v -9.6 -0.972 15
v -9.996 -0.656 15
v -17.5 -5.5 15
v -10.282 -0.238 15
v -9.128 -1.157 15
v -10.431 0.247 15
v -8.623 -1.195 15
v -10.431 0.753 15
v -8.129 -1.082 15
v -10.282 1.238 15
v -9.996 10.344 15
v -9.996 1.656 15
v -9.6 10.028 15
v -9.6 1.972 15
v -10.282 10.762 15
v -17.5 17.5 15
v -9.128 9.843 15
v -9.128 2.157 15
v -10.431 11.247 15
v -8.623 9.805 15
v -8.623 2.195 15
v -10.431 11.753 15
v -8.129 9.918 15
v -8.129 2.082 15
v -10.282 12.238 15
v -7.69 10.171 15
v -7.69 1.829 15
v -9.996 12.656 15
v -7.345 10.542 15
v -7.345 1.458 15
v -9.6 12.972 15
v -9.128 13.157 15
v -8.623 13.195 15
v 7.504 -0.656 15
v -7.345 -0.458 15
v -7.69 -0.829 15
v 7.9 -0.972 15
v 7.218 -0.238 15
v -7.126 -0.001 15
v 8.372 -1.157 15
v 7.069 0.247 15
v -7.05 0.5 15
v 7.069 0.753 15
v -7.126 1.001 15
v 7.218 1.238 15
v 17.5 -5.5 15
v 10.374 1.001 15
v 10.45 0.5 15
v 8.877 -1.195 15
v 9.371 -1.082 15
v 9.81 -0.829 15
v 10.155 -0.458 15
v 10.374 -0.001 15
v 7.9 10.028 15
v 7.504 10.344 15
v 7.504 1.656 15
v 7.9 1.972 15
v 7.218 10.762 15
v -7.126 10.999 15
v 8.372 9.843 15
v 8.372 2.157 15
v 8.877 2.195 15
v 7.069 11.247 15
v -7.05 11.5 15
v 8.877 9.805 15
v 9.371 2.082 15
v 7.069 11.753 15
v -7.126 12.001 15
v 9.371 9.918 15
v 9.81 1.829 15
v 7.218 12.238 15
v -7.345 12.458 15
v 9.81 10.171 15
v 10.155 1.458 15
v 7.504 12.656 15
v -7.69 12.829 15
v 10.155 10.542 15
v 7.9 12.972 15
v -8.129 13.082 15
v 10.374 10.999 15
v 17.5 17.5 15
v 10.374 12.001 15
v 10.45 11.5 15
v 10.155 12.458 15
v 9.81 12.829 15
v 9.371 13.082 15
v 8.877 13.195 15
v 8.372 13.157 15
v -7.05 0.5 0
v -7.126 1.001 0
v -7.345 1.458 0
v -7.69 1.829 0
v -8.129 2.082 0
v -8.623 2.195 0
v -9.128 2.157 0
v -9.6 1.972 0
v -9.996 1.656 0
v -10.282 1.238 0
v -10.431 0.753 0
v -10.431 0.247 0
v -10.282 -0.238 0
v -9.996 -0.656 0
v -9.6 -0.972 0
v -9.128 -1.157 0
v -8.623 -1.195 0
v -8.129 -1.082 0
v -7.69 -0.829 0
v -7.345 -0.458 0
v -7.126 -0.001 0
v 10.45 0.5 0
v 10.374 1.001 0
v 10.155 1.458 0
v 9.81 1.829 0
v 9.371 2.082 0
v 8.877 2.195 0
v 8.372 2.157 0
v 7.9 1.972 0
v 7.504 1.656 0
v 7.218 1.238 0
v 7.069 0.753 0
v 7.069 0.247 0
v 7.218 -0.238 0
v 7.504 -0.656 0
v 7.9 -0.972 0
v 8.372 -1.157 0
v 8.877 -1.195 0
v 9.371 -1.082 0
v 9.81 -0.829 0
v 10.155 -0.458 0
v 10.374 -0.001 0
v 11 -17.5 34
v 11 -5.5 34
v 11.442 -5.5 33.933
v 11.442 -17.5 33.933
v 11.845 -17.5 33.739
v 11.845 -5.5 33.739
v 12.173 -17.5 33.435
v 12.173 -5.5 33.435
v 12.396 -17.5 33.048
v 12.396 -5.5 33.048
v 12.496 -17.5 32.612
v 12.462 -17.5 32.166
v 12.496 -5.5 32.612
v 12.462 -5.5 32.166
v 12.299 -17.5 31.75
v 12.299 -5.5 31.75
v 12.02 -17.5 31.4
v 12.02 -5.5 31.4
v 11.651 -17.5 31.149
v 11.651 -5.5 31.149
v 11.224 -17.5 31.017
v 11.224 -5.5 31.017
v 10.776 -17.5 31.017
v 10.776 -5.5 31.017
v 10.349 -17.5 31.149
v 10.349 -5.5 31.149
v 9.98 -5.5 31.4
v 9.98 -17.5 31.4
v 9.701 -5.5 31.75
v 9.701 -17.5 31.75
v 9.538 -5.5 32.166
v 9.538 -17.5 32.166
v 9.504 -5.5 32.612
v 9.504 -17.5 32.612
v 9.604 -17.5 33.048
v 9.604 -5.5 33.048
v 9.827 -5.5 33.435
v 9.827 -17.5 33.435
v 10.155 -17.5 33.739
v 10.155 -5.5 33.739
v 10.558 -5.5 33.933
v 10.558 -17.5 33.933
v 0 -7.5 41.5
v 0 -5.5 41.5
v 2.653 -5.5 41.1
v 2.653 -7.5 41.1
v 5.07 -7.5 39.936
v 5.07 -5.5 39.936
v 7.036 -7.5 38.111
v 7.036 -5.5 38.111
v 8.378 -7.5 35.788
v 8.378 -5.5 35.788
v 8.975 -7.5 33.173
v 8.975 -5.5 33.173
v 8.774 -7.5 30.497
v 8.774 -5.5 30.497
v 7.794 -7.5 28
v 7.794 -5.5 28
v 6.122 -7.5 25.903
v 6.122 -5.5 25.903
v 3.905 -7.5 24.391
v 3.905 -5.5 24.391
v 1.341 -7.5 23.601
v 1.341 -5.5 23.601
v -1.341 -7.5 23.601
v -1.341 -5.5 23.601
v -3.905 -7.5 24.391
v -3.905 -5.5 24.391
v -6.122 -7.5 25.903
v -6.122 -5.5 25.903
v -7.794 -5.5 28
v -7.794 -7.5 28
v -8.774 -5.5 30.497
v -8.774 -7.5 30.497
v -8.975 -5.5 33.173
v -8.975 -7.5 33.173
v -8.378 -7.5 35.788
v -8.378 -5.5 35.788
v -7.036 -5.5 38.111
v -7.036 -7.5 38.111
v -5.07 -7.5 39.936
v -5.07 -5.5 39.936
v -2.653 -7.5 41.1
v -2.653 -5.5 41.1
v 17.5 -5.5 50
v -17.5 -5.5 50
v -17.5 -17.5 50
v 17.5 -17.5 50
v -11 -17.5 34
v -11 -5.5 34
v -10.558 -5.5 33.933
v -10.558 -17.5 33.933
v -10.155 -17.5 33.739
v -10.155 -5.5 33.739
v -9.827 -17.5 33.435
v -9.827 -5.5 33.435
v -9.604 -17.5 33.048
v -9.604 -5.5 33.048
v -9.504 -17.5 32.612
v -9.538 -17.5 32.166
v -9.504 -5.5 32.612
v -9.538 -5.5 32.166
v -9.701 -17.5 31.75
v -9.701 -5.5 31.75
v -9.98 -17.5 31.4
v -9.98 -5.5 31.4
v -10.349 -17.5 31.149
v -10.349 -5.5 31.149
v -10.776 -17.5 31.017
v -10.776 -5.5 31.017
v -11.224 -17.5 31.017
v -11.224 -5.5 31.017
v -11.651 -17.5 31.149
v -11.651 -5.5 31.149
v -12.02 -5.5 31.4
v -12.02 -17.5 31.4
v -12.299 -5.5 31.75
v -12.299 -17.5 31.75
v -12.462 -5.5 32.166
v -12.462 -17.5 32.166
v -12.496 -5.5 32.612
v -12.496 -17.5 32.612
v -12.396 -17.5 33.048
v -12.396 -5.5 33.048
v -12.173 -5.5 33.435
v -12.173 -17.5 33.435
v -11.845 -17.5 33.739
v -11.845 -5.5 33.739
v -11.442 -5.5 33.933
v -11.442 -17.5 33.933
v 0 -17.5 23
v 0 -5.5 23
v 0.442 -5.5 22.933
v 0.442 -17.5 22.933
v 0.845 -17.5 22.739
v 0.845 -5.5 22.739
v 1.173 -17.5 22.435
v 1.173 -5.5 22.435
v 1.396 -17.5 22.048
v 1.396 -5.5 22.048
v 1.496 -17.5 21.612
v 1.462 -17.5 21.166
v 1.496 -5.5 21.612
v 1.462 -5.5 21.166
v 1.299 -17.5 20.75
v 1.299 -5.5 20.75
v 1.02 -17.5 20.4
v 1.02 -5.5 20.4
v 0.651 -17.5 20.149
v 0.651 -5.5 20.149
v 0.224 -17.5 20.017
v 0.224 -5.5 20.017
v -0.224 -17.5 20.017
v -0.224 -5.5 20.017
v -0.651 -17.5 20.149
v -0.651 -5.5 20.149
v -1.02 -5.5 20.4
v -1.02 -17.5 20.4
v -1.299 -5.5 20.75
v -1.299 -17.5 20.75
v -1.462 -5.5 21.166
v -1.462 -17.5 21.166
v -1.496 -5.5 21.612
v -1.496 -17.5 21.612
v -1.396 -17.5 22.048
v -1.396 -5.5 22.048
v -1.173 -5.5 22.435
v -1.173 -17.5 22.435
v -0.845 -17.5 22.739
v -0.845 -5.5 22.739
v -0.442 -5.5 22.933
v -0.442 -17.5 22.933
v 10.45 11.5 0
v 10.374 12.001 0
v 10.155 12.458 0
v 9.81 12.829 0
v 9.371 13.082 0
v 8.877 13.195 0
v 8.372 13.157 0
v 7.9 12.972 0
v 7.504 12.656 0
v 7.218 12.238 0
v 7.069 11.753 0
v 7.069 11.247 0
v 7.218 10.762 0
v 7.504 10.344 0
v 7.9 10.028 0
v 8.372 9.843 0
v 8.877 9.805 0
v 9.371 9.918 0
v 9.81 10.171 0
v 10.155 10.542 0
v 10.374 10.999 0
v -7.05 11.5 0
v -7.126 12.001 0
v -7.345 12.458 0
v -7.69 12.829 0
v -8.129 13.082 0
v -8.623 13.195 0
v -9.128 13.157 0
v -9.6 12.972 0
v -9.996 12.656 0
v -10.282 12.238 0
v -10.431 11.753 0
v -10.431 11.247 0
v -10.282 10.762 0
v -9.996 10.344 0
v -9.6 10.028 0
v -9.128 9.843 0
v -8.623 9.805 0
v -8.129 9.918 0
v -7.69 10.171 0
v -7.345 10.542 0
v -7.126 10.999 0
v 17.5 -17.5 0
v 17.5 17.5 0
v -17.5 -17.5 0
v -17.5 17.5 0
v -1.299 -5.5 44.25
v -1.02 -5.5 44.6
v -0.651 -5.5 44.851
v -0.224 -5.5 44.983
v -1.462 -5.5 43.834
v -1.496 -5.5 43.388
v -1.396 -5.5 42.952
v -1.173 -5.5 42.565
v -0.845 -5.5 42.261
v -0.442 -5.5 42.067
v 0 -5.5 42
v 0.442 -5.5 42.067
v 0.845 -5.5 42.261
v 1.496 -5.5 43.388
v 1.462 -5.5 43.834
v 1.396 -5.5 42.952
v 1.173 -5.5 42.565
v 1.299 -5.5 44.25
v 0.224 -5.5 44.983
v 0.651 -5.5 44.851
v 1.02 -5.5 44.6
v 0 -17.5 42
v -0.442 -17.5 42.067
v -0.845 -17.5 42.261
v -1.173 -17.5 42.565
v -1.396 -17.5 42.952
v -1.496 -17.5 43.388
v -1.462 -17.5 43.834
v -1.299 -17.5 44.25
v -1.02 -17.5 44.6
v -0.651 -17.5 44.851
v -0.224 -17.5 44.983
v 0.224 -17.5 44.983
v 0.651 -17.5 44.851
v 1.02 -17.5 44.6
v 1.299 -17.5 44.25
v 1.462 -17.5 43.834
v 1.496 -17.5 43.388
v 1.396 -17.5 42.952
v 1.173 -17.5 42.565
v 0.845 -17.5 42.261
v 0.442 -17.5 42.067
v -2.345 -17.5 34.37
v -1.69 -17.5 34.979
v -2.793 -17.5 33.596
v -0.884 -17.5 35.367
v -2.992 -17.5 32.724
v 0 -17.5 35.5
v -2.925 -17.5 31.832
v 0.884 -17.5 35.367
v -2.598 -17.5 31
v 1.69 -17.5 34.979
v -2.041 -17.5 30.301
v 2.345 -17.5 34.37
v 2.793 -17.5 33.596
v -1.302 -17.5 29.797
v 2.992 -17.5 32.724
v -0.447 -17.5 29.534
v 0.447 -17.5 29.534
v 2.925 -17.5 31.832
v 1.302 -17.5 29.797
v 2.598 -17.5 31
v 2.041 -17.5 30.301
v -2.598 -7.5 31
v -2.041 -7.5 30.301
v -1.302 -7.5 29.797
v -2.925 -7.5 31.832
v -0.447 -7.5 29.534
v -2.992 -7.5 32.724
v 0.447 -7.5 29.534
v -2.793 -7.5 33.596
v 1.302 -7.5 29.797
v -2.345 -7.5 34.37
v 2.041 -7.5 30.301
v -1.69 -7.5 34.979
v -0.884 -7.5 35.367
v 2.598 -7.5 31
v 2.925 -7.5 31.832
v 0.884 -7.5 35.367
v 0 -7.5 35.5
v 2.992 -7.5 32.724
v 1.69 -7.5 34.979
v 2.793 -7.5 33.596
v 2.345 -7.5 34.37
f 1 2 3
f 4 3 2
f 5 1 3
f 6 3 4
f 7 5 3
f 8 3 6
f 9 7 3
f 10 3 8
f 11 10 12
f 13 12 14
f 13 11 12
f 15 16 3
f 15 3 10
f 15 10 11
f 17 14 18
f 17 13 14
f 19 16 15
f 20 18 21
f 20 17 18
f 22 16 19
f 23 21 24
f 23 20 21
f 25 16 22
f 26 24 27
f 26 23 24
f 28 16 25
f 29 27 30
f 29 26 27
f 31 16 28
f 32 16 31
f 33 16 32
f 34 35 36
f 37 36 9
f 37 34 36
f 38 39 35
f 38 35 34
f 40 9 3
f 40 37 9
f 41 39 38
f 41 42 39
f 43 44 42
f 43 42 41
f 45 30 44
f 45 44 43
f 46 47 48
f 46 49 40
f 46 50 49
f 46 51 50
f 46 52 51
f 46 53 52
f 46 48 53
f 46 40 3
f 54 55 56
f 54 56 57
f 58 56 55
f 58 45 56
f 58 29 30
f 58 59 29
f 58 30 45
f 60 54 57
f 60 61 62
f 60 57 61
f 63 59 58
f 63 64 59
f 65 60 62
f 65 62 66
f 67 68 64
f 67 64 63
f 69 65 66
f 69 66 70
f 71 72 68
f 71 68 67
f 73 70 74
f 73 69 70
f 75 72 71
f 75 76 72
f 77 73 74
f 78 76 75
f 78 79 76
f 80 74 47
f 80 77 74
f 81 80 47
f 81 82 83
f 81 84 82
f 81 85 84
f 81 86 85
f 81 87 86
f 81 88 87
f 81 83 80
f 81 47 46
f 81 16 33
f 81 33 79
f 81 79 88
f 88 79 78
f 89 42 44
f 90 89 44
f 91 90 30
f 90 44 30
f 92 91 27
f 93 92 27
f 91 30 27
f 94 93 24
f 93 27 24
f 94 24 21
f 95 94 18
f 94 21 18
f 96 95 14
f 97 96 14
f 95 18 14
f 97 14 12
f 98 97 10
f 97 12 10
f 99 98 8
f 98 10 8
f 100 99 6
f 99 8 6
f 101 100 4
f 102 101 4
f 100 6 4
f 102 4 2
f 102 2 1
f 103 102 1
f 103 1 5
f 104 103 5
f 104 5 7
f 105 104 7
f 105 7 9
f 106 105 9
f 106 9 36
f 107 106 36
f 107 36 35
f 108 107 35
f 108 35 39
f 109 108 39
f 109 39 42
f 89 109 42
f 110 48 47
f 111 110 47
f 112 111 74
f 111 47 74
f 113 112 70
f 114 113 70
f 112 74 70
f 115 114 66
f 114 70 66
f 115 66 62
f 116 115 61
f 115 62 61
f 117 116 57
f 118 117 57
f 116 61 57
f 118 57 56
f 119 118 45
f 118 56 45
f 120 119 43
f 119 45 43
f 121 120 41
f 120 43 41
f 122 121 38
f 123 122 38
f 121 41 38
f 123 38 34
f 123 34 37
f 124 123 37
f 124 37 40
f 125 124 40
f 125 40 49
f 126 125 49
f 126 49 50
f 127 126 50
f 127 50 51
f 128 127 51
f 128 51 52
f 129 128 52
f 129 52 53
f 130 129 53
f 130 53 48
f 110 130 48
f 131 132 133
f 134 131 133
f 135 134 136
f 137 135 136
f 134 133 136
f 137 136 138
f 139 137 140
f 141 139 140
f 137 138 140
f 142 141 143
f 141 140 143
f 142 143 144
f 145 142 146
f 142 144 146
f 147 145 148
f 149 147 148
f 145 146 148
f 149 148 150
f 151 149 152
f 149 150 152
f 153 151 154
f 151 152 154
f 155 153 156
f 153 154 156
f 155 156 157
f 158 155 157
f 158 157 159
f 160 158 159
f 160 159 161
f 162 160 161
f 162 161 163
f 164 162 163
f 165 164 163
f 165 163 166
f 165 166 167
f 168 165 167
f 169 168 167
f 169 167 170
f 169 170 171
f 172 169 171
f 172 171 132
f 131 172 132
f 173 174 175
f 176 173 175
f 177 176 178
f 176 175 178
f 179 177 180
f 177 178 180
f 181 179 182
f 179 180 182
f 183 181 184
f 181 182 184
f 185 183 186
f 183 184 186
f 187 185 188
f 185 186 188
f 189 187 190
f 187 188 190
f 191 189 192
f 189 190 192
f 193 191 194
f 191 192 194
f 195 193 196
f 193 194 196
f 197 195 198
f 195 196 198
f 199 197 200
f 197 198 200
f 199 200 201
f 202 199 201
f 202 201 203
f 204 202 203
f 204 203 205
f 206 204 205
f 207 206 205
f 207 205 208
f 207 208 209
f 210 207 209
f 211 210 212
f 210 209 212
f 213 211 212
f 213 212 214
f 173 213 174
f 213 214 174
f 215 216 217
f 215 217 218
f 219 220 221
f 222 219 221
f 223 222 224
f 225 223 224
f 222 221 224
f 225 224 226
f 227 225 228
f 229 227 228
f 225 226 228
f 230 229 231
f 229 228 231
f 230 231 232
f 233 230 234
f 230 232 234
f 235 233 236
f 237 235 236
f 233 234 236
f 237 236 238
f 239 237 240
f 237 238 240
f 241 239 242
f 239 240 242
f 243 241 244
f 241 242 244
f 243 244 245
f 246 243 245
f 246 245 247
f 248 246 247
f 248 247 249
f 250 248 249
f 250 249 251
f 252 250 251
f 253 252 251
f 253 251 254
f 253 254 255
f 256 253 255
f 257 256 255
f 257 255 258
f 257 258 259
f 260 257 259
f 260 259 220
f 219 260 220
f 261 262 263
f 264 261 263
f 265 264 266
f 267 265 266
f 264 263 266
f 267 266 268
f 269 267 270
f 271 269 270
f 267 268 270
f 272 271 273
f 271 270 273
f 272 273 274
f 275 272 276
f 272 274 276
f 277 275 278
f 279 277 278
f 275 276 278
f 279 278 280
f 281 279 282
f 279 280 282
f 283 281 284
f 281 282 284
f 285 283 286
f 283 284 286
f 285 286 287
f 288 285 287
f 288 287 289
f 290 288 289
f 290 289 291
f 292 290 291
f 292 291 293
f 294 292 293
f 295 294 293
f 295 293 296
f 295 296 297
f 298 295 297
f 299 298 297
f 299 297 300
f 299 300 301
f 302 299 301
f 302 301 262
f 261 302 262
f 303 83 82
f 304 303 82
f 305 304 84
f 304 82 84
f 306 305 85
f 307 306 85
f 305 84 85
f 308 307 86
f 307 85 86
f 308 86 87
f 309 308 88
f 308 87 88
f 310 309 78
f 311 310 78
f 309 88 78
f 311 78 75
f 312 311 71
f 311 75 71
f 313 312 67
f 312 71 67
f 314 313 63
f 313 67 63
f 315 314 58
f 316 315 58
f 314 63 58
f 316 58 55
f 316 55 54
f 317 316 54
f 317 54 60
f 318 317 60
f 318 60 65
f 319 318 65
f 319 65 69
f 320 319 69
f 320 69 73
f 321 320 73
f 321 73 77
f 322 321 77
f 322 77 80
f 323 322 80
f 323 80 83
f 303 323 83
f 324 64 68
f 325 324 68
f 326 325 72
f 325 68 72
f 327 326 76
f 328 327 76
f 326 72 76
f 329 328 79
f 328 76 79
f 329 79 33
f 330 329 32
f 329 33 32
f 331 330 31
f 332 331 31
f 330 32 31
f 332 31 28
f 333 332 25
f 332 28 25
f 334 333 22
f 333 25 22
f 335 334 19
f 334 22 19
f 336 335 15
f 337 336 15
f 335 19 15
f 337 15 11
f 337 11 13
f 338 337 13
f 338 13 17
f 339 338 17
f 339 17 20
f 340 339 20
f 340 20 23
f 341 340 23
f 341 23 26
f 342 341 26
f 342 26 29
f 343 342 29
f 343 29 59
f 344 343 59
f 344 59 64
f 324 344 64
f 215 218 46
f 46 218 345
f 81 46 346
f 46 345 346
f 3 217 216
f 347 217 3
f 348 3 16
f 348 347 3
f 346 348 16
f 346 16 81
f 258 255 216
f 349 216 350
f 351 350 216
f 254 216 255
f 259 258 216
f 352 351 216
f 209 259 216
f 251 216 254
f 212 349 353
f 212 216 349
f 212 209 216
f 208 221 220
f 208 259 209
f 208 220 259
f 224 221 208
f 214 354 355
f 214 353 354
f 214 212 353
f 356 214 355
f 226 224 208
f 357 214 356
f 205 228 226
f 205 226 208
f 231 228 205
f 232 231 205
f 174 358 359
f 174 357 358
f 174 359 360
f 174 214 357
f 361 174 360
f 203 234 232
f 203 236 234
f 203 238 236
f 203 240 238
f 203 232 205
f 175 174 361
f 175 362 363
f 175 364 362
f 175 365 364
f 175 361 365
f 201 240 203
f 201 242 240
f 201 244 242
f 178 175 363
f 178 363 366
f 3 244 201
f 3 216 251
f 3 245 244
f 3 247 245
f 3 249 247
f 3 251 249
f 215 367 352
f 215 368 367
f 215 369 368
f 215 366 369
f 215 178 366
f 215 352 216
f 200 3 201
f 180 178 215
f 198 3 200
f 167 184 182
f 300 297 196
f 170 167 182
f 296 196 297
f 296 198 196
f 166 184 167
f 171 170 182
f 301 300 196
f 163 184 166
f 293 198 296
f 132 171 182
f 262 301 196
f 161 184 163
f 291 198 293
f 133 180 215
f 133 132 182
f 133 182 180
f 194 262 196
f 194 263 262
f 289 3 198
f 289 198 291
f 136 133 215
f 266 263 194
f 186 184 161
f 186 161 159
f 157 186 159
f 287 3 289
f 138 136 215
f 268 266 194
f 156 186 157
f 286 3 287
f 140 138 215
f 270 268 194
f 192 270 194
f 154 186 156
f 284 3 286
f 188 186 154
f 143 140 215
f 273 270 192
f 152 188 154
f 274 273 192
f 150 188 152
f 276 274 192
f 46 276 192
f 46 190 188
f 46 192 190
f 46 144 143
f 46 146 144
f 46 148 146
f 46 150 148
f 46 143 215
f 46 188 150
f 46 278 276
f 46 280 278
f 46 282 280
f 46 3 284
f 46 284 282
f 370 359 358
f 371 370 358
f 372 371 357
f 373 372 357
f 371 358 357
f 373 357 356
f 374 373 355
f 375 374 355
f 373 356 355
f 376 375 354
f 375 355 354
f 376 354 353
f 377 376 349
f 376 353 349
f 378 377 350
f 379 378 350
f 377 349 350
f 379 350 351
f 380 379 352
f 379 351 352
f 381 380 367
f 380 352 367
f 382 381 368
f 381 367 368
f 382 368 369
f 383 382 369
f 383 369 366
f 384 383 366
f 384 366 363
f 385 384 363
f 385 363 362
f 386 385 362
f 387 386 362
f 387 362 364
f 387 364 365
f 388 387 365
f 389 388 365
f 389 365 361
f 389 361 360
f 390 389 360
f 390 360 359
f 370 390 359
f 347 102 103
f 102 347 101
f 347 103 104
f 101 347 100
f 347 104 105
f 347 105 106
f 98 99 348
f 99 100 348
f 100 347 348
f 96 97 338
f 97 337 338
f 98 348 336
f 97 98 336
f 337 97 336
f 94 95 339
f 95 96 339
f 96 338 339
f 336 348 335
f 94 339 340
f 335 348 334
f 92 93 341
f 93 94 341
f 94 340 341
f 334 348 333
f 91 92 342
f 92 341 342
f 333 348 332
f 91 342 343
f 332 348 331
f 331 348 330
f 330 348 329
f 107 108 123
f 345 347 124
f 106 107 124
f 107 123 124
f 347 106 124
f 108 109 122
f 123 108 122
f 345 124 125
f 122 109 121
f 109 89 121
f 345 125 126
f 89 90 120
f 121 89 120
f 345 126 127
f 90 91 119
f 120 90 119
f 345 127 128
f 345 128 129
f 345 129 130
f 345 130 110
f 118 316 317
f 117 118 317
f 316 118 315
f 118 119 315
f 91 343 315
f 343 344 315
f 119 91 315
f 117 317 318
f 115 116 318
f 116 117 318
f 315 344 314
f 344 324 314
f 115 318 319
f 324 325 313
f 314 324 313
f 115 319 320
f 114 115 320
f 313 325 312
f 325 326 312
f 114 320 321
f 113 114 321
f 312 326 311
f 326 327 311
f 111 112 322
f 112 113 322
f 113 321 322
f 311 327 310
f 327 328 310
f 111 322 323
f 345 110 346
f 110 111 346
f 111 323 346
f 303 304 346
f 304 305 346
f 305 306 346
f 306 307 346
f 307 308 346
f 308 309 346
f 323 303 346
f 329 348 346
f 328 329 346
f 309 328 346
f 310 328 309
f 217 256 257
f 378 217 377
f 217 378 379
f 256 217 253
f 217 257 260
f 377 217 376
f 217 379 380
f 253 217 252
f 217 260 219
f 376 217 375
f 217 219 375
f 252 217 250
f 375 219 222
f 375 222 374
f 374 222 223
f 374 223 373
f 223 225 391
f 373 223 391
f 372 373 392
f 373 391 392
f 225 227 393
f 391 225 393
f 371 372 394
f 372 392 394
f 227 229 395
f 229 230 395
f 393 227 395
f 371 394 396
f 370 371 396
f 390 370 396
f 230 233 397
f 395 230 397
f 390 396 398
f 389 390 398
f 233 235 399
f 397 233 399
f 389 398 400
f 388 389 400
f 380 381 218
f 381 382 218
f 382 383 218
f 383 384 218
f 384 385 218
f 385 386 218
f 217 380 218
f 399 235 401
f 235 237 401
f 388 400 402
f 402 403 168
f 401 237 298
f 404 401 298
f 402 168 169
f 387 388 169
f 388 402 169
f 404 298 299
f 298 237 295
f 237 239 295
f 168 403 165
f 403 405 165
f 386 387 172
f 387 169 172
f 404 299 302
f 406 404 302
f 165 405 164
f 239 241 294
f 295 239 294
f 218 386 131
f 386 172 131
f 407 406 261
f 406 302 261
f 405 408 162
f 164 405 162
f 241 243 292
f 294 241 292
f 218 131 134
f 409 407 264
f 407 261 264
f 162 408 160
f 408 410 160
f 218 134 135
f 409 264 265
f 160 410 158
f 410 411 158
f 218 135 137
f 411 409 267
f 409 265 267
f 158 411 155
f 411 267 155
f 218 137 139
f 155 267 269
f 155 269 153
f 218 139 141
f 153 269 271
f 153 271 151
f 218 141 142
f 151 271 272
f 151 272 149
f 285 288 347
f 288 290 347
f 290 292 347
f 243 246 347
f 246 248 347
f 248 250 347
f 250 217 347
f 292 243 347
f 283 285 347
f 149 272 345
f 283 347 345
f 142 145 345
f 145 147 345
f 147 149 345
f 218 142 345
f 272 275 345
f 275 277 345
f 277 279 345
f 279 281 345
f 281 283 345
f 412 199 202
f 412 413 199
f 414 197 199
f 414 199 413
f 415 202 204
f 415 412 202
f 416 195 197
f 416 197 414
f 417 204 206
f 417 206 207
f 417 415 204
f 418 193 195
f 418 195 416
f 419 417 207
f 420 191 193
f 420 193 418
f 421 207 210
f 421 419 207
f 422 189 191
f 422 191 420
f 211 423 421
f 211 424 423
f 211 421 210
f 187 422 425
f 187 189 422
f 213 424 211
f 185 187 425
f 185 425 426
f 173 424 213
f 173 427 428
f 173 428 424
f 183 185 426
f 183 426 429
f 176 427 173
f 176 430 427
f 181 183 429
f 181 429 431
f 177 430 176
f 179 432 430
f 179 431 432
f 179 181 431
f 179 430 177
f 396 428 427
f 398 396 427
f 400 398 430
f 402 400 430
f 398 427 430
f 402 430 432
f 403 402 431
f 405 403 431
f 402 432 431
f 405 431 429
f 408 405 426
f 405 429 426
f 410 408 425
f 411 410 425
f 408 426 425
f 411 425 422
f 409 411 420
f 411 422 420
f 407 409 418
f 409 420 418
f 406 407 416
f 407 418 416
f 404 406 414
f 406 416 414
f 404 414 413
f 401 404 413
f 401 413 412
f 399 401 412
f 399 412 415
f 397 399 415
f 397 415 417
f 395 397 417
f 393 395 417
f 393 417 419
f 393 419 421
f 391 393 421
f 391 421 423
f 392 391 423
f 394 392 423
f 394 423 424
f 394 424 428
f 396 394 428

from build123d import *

# Parameters (mm, degrees)
SKETCH2_W           = 35
SKETCH2_H           = 35
BOSS_EXTRUDE1_DEPTH = 15
SKETCH3_W           = 35
SKETCH3_H           = 12
BOSS_EXTRUDE2_DEPTH = 35
SKETCH4_R           = 9
CUT_EXTRUDE1_DEPTH  = 2
SKETCH5_R           = 3
CUT_EXTRUDE2_DEPTH  = 14
SKETCH6_R           = 1.5
CUT_EXTRUDE3_DEPTH  = 58.751623354
SKETCH8_R           = 1.7
CUT_EXTRUDE4_DEPTH  = 43.866070499


with BuildPart() as part:
    # Sketch2 → Boss-Extrude1 (new body)
    with BuildSketch(Plane.XY):
        Rectangle(SKETCH2_W, SKETCH2_H)
    extrude(amount=BOSS_EXTRUDE1_DEPTH)

    # Sketch3 → Boss-Extrude2 (add)
    with BuildSketch(Plane.XY.offset(15)):
        with Locations((0, -11.5)):
            Rectangle(SKETCH3_W, SKETCH3_H)
    extrude(amount=BOSS_EXTRUDE2_DEPTH)

    # Sketch4 → Cut-Extrude1 (cut)
    with BuildSketch(Plane(origin=(0, -5.5, 0), x_dir=(1, 0, 0), z_dir=(0, 1, 0))):
        with Locations(Location((0, -32.5, 0), (0, 0, 270))):
            Circle(SKETCH4_R)
    extrude(amount=-CUT_EXTRUDE1_DEPTH, mode=Mode.SUBTRACT)

    # Sketch5 → Cut-Extrude2 (cut)
    with BuildSketch(Plane(origin=(0, -7.5, 0), x_dir=(1, 0, 0), z_dir=(0, 1, 0))):
        with Locations(Location((0, -32.5, 0), (0, 0, 270))):
            Circle(SKETCH5_R)
    extrude(amount=-CUT_EXTRUDE2_DEPTH, mode=Mode.SUBTRACT)

    # Sketch6 → Cut-Extrude3 (cut, through all)
    with BuildSketch(Plane(origin=(0, -5.5, 0), x_dir=(1, 0, 0), z_dir=(0, 1, 0))):
        with Locations(Location((0, -21.5, 0), (0, 0, 270))):
            Circle(SKETCH6_R)
        with Locations(Location((0, -43.5, 0), (0, 0, 90))):
            Circle(SKETCH6_R)
        with Locations(Location((-11, -32.5, 0), (0, 0, 270))):
            Circle(SKETCH6_R)
        with Locations(Location((11, -32.5, 0), (0, 0, 270))):
            Circle(SKETCH6_R)
    extrude(amount=-CUT_EXTRUDE3_DEPTH, mode=Mode.SUBTRACT)

    # Sketch8 → Cut-Extrude4 (cut, through all)
    with BuildSketch(Plane.XY.offset(15)):
        with Locations((-8.75, 0.5)):
            Circle(SKETCH8_R)
        with Locations((8.75, 0.5)):
            Circle(SKETCH8_R)
        with Locations((8.75, 11.5)):
            Circle(SKETCH8_R)
        with Locations((-8.75, 11.5)):
            Circle(SKETCH8_R)
    extrude(amount=-CUT_EXTRUDE4_DEPTH, mode=Mode.SUBTRACT)


solid = part.part
